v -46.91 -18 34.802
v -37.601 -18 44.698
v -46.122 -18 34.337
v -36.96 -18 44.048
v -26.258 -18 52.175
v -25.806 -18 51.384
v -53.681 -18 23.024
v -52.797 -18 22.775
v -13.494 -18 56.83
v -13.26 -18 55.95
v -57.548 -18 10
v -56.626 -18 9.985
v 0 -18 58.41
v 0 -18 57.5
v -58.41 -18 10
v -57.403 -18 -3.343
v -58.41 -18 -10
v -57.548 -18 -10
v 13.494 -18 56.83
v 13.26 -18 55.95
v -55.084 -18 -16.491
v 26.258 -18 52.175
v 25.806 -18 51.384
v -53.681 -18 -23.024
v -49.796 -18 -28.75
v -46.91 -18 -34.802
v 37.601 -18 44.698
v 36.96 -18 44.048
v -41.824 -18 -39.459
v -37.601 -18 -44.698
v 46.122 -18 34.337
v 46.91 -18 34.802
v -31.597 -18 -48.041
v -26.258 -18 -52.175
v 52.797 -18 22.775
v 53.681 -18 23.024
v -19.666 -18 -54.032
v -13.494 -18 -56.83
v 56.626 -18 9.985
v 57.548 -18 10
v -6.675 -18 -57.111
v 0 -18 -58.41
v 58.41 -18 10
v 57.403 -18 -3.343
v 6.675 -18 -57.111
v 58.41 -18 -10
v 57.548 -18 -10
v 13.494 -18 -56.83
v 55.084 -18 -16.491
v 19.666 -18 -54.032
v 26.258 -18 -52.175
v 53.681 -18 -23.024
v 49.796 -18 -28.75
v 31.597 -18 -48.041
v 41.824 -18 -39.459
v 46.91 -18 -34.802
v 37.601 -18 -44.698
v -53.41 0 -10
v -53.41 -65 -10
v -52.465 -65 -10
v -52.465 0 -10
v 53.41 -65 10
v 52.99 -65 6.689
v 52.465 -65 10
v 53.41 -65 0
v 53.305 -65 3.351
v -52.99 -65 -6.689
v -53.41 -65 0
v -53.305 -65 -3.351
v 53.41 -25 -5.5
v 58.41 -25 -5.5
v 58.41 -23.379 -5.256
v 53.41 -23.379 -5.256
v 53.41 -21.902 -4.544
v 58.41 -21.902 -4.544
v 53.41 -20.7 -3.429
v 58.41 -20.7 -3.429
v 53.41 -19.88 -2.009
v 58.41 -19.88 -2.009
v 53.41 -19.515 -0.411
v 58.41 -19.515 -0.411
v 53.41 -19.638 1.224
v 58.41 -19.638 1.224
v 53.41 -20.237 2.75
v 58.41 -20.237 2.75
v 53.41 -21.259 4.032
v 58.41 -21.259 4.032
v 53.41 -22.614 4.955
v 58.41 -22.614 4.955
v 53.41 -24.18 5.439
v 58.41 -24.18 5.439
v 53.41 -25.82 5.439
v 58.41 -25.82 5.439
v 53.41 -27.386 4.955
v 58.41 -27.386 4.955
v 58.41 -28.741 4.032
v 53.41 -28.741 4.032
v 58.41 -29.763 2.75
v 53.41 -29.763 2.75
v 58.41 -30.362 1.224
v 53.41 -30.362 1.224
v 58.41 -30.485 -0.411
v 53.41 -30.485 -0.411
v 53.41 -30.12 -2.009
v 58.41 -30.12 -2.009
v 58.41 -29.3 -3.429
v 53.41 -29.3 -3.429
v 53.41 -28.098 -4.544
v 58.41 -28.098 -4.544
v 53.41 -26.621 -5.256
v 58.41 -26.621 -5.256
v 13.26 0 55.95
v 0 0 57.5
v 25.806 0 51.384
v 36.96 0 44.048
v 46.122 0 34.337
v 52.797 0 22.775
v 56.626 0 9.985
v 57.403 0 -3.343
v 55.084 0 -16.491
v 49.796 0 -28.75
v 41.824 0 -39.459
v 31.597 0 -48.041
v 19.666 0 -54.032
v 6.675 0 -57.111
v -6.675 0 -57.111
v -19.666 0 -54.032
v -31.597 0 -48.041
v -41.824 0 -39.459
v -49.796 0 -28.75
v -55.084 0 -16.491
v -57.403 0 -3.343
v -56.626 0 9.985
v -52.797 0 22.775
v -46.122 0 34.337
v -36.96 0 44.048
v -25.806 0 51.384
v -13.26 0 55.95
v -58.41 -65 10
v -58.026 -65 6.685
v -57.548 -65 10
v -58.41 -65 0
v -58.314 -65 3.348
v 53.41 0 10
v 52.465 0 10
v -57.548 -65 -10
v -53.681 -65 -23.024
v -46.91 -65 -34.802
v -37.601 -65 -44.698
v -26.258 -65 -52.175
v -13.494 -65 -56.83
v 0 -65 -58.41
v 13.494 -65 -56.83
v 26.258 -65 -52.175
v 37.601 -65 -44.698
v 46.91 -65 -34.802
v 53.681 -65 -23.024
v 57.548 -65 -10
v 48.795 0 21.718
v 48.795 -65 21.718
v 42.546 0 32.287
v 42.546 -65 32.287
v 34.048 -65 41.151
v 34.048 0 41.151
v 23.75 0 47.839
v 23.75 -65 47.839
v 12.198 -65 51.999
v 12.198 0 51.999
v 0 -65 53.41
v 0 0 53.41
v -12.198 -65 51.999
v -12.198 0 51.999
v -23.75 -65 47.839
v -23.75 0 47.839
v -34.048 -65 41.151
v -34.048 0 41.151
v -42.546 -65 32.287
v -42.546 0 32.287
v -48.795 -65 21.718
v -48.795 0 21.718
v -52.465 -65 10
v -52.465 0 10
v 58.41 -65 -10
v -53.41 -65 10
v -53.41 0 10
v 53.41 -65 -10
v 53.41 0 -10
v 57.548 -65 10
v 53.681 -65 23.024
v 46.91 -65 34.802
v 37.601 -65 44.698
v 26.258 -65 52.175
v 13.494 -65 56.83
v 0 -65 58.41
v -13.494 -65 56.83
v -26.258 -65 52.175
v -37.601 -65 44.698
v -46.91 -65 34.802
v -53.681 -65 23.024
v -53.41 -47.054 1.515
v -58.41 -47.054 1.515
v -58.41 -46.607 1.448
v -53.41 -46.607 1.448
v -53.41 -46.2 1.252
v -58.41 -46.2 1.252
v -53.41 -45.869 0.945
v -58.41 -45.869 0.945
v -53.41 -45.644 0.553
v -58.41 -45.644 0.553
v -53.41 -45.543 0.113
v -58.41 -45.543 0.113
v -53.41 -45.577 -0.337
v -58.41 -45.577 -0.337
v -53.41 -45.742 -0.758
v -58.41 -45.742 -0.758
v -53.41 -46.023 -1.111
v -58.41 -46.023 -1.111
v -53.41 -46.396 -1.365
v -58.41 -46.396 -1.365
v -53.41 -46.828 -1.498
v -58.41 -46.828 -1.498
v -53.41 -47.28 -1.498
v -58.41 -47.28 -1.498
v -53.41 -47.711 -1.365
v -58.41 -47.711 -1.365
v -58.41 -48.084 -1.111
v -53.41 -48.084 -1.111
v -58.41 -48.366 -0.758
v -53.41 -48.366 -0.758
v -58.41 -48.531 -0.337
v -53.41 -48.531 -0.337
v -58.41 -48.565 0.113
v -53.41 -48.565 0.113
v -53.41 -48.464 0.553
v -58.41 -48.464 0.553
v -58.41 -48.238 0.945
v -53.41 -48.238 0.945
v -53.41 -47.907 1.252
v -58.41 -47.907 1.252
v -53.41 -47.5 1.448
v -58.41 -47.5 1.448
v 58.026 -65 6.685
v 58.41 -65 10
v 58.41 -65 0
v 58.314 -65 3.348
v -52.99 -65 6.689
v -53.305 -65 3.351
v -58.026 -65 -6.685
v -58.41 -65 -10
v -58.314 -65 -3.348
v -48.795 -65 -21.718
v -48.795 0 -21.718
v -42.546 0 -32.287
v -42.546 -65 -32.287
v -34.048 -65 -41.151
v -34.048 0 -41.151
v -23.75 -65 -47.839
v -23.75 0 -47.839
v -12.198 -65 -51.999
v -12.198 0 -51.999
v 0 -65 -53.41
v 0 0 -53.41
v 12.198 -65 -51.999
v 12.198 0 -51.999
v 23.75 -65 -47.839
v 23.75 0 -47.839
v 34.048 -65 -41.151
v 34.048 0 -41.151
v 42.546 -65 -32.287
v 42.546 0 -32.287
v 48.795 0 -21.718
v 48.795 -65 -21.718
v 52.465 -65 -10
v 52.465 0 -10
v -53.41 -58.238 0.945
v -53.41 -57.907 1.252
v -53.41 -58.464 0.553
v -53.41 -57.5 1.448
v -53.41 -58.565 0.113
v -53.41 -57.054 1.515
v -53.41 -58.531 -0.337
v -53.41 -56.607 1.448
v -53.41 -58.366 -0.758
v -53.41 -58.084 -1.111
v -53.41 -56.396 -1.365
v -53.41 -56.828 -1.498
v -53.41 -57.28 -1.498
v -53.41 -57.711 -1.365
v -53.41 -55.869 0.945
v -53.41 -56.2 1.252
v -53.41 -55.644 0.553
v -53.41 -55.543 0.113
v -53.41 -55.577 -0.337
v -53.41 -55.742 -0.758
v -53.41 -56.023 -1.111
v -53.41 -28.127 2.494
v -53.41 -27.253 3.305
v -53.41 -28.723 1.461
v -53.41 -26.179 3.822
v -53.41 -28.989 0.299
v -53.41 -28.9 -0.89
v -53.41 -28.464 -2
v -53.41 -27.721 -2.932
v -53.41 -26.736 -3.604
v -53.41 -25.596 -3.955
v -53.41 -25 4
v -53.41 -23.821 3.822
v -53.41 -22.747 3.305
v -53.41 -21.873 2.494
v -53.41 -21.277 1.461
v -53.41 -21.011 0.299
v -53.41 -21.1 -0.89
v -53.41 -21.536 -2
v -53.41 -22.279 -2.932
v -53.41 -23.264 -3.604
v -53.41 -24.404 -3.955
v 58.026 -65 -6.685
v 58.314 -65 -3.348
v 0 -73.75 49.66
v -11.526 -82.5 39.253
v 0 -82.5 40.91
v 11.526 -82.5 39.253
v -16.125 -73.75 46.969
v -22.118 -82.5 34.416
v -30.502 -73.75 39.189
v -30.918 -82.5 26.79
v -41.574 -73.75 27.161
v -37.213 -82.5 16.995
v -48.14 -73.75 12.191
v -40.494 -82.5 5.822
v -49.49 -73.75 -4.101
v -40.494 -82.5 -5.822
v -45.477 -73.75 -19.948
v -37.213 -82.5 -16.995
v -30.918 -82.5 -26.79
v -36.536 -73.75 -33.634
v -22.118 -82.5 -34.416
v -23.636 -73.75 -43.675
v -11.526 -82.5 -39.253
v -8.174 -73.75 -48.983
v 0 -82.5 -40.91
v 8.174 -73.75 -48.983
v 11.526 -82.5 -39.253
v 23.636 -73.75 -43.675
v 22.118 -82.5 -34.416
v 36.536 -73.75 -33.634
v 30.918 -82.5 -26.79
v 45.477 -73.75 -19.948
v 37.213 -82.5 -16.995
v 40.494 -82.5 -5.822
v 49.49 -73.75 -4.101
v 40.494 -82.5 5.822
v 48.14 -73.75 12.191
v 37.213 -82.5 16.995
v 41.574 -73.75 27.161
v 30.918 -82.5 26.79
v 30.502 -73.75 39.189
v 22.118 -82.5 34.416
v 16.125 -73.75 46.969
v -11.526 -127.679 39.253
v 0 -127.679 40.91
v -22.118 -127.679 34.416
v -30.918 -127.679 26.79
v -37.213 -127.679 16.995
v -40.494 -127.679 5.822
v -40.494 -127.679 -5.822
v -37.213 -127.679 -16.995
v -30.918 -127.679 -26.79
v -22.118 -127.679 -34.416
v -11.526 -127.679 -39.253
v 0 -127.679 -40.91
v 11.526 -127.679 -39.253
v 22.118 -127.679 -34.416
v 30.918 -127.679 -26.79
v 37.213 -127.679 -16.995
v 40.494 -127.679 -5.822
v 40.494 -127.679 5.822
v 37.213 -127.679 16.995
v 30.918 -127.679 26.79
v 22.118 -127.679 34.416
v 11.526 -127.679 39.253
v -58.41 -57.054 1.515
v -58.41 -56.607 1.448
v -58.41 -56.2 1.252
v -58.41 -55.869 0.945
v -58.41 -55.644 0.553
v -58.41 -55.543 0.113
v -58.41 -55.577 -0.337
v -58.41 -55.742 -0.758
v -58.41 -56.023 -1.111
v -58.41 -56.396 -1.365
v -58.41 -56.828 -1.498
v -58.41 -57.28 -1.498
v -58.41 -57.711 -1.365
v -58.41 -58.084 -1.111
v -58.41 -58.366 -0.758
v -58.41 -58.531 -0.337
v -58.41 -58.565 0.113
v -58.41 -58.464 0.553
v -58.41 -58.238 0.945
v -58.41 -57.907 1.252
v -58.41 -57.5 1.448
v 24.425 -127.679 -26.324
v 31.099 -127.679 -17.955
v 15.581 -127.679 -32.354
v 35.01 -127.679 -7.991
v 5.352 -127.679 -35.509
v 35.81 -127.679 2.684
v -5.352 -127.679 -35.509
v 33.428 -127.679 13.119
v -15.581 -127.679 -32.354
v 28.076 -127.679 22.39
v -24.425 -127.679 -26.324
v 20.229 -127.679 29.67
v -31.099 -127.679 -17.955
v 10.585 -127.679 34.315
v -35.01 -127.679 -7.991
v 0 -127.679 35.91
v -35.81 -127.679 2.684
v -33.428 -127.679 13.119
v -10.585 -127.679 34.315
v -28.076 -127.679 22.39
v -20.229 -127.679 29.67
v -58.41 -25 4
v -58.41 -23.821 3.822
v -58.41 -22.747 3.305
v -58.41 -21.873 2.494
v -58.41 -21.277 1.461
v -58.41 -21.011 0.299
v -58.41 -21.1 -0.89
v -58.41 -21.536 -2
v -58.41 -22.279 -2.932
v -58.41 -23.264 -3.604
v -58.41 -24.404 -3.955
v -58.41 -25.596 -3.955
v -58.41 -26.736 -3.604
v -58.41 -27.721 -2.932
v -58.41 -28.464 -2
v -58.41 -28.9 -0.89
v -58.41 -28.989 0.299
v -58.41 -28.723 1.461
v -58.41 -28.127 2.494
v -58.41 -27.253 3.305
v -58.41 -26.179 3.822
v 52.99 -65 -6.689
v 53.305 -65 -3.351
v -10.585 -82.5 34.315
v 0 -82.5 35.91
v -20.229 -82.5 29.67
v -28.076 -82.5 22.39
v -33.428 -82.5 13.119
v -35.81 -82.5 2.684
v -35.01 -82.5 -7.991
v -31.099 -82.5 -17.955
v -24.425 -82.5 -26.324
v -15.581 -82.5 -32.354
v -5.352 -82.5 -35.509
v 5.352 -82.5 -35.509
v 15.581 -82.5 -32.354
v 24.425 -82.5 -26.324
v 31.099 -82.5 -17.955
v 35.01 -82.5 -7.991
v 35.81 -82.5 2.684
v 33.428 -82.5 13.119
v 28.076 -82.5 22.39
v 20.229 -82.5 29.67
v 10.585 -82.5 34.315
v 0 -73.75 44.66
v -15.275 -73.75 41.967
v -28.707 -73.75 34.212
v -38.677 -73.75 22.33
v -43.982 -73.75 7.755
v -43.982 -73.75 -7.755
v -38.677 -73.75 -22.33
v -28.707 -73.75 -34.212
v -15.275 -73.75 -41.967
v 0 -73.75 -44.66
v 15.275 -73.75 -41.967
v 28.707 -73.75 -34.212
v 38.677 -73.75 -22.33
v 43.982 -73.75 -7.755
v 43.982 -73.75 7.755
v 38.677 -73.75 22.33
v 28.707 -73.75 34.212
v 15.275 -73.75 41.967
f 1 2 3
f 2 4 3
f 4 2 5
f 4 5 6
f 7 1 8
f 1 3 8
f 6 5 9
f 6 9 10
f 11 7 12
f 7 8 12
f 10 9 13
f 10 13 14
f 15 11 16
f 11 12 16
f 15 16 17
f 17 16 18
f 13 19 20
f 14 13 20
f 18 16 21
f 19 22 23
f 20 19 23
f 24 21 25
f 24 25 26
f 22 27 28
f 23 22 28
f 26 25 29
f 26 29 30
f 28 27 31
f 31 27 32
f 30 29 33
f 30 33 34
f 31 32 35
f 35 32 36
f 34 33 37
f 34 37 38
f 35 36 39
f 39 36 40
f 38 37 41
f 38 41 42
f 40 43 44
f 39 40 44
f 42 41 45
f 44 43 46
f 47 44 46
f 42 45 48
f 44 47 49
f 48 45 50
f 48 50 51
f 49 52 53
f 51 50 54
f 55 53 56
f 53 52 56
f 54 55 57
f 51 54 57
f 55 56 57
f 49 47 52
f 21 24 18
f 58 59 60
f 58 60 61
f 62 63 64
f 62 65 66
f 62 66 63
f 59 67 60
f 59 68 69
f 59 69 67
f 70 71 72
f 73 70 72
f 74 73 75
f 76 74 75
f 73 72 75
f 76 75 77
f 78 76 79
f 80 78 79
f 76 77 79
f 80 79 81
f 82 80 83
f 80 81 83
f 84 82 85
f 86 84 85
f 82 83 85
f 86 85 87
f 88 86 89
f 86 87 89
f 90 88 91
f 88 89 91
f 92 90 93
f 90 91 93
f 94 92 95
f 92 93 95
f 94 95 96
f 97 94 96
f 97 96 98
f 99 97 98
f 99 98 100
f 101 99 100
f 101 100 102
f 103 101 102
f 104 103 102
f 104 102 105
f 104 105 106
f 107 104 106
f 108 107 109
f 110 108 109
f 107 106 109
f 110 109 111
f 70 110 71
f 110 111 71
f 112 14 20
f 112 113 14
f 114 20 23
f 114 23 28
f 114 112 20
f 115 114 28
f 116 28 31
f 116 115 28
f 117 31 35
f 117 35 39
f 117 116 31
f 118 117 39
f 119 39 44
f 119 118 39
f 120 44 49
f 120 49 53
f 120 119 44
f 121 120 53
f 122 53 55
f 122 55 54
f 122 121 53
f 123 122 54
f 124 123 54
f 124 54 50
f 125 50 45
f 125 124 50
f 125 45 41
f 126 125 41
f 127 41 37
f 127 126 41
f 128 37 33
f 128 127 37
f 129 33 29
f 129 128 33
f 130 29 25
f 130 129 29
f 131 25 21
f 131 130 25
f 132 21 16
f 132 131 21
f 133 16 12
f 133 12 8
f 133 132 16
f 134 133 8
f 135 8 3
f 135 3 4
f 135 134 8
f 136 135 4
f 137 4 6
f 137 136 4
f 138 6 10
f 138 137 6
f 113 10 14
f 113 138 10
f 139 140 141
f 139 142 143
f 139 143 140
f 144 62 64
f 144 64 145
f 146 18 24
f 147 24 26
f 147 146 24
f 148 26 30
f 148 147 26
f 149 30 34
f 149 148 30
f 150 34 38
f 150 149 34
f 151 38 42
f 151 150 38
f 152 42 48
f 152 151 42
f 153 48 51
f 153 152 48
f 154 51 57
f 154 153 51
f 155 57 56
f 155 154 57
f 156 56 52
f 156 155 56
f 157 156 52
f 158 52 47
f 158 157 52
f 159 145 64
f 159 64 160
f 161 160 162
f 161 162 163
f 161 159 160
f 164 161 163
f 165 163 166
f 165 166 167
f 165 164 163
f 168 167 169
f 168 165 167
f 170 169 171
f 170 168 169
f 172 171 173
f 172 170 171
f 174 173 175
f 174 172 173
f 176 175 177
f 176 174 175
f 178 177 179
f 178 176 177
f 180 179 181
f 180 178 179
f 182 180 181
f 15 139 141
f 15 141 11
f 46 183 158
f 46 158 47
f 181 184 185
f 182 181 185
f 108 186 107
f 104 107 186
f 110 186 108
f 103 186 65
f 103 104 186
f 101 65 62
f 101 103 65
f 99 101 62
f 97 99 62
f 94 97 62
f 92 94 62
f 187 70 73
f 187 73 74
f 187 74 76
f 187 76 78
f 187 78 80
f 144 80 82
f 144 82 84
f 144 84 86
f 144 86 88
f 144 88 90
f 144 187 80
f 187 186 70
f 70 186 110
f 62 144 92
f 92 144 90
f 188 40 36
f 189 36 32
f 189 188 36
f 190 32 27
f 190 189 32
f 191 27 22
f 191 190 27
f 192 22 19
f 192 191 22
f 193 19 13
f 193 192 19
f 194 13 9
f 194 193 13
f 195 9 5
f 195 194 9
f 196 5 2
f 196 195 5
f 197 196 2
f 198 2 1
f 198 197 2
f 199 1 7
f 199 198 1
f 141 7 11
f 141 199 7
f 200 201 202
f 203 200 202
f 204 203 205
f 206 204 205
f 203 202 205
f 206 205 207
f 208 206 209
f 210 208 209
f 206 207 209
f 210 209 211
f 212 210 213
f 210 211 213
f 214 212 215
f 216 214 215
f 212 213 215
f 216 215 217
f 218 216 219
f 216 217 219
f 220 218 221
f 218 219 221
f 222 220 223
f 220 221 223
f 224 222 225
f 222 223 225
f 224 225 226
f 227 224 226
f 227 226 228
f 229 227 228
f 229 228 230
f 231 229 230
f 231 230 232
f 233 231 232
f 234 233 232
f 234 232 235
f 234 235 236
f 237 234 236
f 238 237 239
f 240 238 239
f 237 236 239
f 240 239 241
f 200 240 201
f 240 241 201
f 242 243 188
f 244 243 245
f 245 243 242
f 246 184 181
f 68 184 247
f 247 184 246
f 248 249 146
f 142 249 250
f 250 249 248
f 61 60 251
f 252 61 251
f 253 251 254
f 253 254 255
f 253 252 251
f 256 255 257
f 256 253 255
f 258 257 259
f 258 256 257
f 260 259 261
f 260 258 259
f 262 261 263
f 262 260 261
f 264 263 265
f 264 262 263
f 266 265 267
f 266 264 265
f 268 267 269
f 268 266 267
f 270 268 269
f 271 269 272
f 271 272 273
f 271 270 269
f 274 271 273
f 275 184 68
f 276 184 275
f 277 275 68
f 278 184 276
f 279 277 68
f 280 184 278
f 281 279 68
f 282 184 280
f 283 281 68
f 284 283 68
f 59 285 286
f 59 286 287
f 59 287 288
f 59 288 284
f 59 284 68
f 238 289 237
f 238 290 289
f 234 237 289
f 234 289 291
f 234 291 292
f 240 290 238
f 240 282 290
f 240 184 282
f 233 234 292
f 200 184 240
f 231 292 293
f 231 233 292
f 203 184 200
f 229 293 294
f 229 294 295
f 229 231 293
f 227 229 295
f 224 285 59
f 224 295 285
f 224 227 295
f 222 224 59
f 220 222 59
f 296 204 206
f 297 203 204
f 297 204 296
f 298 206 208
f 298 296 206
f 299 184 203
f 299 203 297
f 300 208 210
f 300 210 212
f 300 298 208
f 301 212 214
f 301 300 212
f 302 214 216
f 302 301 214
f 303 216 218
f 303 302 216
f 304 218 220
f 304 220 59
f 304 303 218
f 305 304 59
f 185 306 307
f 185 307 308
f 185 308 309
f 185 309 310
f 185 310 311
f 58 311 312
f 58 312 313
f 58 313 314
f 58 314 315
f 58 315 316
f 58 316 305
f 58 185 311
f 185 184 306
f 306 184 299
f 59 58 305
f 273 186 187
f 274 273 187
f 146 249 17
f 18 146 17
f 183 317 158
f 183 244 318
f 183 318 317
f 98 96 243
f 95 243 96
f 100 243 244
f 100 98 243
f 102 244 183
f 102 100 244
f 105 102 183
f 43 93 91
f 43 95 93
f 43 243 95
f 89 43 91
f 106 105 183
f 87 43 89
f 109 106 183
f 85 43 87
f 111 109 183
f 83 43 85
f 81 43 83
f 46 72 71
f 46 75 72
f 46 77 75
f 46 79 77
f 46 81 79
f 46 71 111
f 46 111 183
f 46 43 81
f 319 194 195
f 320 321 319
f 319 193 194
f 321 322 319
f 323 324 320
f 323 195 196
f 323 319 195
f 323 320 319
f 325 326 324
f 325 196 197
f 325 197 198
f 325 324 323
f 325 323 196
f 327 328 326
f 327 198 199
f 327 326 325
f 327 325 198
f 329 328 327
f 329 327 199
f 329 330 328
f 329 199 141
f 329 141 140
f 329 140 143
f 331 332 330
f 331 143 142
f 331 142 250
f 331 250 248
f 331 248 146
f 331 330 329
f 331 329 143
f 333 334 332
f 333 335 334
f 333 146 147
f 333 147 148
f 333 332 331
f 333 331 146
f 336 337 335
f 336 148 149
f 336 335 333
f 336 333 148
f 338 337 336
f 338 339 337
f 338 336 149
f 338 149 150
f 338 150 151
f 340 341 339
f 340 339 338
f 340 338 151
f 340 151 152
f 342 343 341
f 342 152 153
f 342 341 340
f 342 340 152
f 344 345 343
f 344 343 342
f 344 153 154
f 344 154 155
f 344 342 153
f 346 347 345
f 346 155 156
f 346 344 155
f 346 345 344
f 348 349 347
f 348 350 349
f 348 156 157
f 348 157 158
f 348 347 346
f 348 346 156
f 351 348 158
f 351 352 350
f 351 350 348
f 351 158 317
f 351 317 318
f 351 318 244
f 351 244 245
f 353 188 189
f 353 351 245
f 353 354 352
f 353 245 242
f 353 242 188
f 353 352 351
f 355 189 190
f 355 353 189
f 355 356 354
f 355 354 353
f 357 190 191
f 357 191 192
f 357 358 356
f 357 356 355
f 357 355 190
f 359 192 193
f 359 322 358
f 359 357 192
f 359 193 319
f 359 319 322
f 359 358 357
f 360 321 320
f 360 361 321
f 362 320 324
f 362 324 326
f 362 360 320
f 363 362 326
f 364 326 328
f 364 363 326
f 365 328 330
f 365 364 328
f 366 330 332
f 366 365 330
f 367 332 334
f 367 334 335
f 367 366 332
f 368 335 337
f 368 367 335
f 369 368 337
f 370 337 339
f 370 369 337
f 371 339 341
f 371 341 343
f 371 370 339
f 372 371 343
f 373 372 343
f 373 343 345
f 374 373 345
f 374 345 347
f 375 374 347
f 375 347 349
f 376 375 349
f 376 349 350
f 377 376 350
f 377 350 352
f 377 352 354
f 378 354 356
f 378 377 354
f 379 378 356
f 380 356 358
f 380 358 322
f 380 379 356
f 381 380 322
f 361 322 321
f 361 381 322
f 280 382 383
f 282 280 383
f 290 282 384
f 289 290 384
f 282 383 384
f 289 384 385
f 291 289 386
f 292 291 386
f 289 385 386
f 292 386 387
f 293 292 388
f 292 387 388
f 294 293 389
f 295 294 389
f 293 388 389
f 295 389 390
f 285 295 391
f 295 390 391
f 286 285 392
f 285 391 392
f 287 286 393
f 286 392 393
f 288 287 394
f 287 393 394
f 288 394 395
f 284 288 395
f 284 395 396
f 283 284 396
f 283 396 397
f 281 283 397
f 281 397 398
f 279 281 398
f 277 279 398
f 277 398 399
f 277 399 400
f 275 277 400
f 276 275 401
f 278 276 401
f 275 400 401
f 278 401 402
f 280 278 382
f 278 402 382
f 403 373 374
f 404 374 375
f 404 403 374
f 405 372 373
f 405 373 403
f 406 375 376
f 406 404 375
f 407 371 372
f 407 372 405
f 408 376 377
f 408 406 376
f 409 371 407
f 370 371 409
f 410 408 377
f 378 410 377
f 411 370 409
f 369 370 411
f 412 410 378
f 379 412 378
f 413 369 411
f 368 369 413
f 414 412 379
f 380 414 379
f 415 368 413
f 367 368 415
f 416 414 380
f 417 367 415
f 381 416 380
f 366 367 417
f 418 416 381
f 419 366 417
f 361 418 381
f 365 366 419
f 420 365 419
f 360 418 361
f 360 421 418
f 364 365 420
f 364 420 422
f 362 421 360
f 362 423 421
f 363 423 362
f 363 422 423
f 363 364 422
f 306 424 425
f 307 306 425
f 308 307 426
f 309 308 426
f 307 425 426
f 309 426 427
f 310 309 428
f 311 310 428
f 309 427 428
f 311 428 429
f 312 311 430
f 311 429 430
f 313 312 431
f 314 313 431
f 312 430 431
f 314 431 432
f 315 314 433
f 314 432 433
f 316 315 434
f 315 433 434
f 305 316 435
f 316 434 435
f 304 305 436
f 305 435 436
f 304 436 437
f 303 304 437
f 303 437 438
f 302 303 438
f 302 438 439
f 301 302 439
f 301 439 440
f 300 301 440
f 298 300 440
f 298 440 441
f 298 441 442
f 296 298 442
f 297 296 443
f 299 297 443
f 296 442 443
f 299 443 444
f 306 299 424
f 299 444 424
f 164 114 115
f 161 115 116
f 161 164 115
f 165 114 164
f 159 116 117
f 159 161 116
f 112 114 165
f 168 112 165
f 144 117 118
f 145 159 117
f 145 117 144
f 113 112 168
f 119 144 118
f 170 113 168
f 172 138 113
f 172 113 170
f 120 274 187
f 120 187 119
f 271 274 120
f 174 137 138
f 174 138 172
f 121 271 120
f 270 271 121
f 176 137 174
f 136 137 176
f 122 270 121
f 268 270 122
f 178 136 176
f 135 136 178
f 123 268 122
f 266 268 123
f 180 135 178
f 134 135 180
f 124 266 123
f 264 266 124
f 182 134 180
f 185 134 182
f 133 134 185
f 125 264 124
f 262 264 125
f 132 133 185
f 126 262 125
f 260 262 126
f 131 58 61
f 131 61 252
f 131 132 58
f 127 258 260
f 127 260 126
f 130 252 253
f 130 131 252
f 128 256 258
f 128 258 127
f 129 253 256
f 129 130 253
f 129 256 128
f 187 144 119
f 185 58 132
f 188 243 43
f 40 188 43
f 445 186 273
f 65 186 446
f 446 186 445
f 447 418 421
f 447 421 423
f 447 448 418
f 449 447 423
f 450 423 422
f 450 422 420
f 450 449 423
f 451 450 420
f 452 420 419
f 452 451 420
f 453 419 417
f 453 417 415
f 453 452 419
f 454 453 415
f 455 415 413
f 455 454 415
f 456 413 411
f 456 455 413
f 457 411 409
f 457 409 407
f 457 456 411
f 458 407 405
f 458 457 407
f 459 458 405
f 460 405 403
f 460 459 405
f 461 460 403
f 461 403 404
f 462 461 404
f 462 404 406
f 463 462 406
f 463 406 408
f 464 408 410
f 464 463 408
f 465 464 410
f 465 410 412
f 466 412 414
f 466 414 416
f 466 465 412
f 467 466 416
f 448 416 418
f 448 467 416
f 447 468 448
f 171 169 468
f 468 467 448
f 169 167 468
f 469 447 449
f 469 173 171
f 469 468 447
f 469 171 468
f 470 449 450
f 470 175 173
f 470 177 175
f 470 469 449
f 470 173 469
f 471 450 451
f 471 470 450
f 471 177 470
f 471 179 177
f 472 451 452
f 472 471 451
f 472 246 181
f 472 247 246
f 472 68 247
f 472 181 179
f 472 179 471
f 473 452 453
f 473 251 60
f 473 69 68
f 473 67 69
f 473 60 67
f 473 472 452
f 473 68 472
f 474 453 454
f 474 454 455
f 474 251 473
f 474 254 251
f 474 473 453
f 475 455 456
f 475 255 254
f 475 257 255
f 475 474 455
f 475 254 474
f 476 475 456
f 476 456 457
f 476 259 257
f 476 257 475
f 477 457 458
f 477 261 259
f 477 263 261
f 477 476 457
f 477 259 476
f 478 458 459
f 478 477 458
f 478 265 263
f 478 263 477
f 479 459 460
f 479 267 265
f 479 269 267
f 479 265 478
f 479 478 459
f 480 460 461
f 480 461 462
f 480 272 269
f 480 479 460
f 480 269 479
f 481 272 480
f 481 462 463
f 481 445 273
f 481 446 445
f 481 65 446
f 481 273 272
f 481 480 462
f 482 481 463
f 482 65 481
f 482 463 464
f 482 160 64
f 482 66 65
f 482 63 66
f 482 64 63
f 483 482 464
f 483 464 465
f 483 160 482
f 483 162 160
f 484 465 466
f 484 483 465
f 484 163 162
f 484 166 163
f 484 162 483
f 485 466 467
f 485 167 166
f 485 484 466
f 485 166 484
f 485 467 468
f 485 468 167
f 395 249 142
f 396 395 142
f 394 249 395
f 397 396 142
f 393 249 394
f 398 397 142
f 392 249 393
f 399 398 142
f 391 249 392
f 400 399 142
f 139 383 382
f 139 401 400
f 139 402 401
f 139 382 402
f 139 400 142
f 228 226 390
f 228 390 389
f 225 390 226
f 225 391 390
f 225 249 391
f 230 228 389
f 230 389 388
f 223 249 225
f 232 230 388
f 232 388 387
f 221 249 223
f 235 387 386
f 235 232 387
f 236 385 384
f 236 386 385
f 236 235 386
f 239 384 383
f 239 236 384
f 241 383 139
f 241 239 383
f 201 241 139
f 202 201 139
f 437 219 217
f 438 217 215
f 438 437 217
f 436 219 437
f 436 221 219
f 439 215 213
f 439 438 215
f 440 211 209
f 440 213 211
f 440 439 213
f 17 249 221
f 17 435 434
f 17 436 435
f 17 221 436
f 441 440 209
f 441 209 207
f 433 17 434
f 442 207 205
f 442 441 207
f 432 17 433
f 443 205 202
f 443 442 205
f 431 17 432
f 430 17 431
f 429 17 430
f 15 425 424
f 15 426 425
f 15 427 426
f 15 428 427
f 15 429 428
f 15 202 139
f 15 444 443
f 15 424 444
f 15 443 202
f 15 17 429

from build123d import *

# Parameters (mm, degrees)
SKETCH14_W              = 0.91
SKETCH14_H              = 18
SKETCH8_W               = 20
SKETCH8_H               = 47
BOSS_EXTRUDE1_DEPTH     = 0.862384063
CUT_EXTRUDE4_REACH      = 181.492
CUT_EXTRUDE4_END_RADIUS = 53.41
SKETCH10_W              = 20
SKETCH10_H              = 65
CIRPATTERN1_COUNT       = 2
SKETCH11_R              = 5.5
CUT_EXTRUDE5_DEPTH      = 5
SKETCH12_R              = 4
SKETCH12_R_2            = 1.515
CUT_EXTRUDE6_DEPTH      = 5


with BuildPart() as part:
    # Sketch1 → Revolve1 (revolve)
    with BuildSketch(Plane.XY, mode=Mode.PRIVATE) as revolve1_sk:
        Polygon((58.41, -65), (40.91, -82.5), (40.91, -127.679491924), (35.91, -127.679491924), (35.91, -82.5), (53.41, -65), (53.41, 0), (58.41, 0), align=None)
    revolve(revolve1_sk.sketch.rotate(Axis((0, 0, 0), (0, -1, 0)), 90), axis=Axis((0, 0, 0), (0, -1, 0)))

    # Sketch14 → Cut-Revolve5 (revolve, cut)
    with BuildSketch(Plane.XY, mode=Mode.PRIVATE) as cut_revolve5_sk:
        with Locations((-57.955, -9)):
            Rectangle(SKETCH14_W, SKETCH14_H)
    revolve(cut_revolve5_sk.sketch.rotate(Axis((0, 0, 0), (0, 1, 0)), 90), axis=Axis((0, 0, 0), (0, 1, 0)), mode=Mode.SUBTRACT)

    # Sketch8 → Boss-Extrude1 (add)
    with BuildSketch(Plane.ZY.offset(58.41)):
        with Locations((0, -41.5)):
            Rectangle(SKETCH8_W, SKETCH8_H)
    boss_extrude1 = extrude(amount=-BOSS_EXTRUDE1_DEPTH)

    # Cut-Extrude4: up to this cylinder (the profile starts outside it)
    cut_extrude4_end = Plane(origin=(0, -32.5, 0), z_dir=(0, 1, 0)) * Cylinder(CUT_EXTRUDE4_END_RADIUS, 470.804, mode=Mode.PRIVATE)
    # Sketch10 → Cut-Extrude4 (cut, up to the surface)
    with BuildSketch(Plane(origin=(-53.41, 0, 0), x_dir=(0, 0, -1), z_dir=(1, 0, 0)), mode=Mode.PRIVATE) as cut_extrude4_sk1:
        with Locations((0, -32.5)):
            Rectangle(SKETCH10_W, SKETCH10_H)
    cut_extrude4_tool1 = extrude(cut_extrude4_sk1.sketch, amount=CUT_EXTRUDE4_REACH, mode=Mode.PRIVATE) - cut_extrude4_end
    cut_extrude4 = cut_extrude4_tool1.solids().sort_by_distance((-53.41, -32.5, 0))[0] + cut_extrude4_tool1.solids().sort_by_distance((-53.41, -32.5, 0))[1]
    add(cut_extrude4, mode=Mode.SUBTRACT)

    # CirPattern1: Boss-Extrude1, Cut-Extrude4 ×2 about axis
    cirpattern1_axis = Axis((0, 0, 0), (0, 1, 0))
    add([boss_extrude1.rotate(cirpattern1_axis, i * 360 / CIRPATTERN1_COUNT) for i in range(1, CIRPATTERN1_COUNT)])
    add([cut_extrude4.rotate(cirpattern1_axis, i * 360 / CIRPATTERN1_COUNT) for i in range(1, CIRPATTERN1_COUNT)], mode=Mode.SUBTRACT)

    # Sketch11 → Cut-Extrude5 (cut)
    with BuildSketch(Plane(origin=(58.41, 0, 0), x_dir=(0, 0, -1), z_dir=(1, 0, 0))):
        with Locations((0, -25)):
            Circle(SKETCH11_R)
    extrude(amount=-CUT_EXTRUDE5_DEPTH, mode=Mode.SUBTRACT)

    # Sketch12 → Cut-Extrude6 (cut)
    with BuildSketch(Plane.ZY.offset(58.41)):
        with Locations((0, -25)):
            Circle(SKETCH12_R)
        with Locations((0, -47.0538)):
            Circle(SKETCH12_R_2)
        with Locations((0, -57.0538)):
            Circle(SKETCH12_R_2)
    extrude(amount=-CUT_EXTRUDE6_DEPTH, mode=Mode.SUBTRACT)


solid = part.part
